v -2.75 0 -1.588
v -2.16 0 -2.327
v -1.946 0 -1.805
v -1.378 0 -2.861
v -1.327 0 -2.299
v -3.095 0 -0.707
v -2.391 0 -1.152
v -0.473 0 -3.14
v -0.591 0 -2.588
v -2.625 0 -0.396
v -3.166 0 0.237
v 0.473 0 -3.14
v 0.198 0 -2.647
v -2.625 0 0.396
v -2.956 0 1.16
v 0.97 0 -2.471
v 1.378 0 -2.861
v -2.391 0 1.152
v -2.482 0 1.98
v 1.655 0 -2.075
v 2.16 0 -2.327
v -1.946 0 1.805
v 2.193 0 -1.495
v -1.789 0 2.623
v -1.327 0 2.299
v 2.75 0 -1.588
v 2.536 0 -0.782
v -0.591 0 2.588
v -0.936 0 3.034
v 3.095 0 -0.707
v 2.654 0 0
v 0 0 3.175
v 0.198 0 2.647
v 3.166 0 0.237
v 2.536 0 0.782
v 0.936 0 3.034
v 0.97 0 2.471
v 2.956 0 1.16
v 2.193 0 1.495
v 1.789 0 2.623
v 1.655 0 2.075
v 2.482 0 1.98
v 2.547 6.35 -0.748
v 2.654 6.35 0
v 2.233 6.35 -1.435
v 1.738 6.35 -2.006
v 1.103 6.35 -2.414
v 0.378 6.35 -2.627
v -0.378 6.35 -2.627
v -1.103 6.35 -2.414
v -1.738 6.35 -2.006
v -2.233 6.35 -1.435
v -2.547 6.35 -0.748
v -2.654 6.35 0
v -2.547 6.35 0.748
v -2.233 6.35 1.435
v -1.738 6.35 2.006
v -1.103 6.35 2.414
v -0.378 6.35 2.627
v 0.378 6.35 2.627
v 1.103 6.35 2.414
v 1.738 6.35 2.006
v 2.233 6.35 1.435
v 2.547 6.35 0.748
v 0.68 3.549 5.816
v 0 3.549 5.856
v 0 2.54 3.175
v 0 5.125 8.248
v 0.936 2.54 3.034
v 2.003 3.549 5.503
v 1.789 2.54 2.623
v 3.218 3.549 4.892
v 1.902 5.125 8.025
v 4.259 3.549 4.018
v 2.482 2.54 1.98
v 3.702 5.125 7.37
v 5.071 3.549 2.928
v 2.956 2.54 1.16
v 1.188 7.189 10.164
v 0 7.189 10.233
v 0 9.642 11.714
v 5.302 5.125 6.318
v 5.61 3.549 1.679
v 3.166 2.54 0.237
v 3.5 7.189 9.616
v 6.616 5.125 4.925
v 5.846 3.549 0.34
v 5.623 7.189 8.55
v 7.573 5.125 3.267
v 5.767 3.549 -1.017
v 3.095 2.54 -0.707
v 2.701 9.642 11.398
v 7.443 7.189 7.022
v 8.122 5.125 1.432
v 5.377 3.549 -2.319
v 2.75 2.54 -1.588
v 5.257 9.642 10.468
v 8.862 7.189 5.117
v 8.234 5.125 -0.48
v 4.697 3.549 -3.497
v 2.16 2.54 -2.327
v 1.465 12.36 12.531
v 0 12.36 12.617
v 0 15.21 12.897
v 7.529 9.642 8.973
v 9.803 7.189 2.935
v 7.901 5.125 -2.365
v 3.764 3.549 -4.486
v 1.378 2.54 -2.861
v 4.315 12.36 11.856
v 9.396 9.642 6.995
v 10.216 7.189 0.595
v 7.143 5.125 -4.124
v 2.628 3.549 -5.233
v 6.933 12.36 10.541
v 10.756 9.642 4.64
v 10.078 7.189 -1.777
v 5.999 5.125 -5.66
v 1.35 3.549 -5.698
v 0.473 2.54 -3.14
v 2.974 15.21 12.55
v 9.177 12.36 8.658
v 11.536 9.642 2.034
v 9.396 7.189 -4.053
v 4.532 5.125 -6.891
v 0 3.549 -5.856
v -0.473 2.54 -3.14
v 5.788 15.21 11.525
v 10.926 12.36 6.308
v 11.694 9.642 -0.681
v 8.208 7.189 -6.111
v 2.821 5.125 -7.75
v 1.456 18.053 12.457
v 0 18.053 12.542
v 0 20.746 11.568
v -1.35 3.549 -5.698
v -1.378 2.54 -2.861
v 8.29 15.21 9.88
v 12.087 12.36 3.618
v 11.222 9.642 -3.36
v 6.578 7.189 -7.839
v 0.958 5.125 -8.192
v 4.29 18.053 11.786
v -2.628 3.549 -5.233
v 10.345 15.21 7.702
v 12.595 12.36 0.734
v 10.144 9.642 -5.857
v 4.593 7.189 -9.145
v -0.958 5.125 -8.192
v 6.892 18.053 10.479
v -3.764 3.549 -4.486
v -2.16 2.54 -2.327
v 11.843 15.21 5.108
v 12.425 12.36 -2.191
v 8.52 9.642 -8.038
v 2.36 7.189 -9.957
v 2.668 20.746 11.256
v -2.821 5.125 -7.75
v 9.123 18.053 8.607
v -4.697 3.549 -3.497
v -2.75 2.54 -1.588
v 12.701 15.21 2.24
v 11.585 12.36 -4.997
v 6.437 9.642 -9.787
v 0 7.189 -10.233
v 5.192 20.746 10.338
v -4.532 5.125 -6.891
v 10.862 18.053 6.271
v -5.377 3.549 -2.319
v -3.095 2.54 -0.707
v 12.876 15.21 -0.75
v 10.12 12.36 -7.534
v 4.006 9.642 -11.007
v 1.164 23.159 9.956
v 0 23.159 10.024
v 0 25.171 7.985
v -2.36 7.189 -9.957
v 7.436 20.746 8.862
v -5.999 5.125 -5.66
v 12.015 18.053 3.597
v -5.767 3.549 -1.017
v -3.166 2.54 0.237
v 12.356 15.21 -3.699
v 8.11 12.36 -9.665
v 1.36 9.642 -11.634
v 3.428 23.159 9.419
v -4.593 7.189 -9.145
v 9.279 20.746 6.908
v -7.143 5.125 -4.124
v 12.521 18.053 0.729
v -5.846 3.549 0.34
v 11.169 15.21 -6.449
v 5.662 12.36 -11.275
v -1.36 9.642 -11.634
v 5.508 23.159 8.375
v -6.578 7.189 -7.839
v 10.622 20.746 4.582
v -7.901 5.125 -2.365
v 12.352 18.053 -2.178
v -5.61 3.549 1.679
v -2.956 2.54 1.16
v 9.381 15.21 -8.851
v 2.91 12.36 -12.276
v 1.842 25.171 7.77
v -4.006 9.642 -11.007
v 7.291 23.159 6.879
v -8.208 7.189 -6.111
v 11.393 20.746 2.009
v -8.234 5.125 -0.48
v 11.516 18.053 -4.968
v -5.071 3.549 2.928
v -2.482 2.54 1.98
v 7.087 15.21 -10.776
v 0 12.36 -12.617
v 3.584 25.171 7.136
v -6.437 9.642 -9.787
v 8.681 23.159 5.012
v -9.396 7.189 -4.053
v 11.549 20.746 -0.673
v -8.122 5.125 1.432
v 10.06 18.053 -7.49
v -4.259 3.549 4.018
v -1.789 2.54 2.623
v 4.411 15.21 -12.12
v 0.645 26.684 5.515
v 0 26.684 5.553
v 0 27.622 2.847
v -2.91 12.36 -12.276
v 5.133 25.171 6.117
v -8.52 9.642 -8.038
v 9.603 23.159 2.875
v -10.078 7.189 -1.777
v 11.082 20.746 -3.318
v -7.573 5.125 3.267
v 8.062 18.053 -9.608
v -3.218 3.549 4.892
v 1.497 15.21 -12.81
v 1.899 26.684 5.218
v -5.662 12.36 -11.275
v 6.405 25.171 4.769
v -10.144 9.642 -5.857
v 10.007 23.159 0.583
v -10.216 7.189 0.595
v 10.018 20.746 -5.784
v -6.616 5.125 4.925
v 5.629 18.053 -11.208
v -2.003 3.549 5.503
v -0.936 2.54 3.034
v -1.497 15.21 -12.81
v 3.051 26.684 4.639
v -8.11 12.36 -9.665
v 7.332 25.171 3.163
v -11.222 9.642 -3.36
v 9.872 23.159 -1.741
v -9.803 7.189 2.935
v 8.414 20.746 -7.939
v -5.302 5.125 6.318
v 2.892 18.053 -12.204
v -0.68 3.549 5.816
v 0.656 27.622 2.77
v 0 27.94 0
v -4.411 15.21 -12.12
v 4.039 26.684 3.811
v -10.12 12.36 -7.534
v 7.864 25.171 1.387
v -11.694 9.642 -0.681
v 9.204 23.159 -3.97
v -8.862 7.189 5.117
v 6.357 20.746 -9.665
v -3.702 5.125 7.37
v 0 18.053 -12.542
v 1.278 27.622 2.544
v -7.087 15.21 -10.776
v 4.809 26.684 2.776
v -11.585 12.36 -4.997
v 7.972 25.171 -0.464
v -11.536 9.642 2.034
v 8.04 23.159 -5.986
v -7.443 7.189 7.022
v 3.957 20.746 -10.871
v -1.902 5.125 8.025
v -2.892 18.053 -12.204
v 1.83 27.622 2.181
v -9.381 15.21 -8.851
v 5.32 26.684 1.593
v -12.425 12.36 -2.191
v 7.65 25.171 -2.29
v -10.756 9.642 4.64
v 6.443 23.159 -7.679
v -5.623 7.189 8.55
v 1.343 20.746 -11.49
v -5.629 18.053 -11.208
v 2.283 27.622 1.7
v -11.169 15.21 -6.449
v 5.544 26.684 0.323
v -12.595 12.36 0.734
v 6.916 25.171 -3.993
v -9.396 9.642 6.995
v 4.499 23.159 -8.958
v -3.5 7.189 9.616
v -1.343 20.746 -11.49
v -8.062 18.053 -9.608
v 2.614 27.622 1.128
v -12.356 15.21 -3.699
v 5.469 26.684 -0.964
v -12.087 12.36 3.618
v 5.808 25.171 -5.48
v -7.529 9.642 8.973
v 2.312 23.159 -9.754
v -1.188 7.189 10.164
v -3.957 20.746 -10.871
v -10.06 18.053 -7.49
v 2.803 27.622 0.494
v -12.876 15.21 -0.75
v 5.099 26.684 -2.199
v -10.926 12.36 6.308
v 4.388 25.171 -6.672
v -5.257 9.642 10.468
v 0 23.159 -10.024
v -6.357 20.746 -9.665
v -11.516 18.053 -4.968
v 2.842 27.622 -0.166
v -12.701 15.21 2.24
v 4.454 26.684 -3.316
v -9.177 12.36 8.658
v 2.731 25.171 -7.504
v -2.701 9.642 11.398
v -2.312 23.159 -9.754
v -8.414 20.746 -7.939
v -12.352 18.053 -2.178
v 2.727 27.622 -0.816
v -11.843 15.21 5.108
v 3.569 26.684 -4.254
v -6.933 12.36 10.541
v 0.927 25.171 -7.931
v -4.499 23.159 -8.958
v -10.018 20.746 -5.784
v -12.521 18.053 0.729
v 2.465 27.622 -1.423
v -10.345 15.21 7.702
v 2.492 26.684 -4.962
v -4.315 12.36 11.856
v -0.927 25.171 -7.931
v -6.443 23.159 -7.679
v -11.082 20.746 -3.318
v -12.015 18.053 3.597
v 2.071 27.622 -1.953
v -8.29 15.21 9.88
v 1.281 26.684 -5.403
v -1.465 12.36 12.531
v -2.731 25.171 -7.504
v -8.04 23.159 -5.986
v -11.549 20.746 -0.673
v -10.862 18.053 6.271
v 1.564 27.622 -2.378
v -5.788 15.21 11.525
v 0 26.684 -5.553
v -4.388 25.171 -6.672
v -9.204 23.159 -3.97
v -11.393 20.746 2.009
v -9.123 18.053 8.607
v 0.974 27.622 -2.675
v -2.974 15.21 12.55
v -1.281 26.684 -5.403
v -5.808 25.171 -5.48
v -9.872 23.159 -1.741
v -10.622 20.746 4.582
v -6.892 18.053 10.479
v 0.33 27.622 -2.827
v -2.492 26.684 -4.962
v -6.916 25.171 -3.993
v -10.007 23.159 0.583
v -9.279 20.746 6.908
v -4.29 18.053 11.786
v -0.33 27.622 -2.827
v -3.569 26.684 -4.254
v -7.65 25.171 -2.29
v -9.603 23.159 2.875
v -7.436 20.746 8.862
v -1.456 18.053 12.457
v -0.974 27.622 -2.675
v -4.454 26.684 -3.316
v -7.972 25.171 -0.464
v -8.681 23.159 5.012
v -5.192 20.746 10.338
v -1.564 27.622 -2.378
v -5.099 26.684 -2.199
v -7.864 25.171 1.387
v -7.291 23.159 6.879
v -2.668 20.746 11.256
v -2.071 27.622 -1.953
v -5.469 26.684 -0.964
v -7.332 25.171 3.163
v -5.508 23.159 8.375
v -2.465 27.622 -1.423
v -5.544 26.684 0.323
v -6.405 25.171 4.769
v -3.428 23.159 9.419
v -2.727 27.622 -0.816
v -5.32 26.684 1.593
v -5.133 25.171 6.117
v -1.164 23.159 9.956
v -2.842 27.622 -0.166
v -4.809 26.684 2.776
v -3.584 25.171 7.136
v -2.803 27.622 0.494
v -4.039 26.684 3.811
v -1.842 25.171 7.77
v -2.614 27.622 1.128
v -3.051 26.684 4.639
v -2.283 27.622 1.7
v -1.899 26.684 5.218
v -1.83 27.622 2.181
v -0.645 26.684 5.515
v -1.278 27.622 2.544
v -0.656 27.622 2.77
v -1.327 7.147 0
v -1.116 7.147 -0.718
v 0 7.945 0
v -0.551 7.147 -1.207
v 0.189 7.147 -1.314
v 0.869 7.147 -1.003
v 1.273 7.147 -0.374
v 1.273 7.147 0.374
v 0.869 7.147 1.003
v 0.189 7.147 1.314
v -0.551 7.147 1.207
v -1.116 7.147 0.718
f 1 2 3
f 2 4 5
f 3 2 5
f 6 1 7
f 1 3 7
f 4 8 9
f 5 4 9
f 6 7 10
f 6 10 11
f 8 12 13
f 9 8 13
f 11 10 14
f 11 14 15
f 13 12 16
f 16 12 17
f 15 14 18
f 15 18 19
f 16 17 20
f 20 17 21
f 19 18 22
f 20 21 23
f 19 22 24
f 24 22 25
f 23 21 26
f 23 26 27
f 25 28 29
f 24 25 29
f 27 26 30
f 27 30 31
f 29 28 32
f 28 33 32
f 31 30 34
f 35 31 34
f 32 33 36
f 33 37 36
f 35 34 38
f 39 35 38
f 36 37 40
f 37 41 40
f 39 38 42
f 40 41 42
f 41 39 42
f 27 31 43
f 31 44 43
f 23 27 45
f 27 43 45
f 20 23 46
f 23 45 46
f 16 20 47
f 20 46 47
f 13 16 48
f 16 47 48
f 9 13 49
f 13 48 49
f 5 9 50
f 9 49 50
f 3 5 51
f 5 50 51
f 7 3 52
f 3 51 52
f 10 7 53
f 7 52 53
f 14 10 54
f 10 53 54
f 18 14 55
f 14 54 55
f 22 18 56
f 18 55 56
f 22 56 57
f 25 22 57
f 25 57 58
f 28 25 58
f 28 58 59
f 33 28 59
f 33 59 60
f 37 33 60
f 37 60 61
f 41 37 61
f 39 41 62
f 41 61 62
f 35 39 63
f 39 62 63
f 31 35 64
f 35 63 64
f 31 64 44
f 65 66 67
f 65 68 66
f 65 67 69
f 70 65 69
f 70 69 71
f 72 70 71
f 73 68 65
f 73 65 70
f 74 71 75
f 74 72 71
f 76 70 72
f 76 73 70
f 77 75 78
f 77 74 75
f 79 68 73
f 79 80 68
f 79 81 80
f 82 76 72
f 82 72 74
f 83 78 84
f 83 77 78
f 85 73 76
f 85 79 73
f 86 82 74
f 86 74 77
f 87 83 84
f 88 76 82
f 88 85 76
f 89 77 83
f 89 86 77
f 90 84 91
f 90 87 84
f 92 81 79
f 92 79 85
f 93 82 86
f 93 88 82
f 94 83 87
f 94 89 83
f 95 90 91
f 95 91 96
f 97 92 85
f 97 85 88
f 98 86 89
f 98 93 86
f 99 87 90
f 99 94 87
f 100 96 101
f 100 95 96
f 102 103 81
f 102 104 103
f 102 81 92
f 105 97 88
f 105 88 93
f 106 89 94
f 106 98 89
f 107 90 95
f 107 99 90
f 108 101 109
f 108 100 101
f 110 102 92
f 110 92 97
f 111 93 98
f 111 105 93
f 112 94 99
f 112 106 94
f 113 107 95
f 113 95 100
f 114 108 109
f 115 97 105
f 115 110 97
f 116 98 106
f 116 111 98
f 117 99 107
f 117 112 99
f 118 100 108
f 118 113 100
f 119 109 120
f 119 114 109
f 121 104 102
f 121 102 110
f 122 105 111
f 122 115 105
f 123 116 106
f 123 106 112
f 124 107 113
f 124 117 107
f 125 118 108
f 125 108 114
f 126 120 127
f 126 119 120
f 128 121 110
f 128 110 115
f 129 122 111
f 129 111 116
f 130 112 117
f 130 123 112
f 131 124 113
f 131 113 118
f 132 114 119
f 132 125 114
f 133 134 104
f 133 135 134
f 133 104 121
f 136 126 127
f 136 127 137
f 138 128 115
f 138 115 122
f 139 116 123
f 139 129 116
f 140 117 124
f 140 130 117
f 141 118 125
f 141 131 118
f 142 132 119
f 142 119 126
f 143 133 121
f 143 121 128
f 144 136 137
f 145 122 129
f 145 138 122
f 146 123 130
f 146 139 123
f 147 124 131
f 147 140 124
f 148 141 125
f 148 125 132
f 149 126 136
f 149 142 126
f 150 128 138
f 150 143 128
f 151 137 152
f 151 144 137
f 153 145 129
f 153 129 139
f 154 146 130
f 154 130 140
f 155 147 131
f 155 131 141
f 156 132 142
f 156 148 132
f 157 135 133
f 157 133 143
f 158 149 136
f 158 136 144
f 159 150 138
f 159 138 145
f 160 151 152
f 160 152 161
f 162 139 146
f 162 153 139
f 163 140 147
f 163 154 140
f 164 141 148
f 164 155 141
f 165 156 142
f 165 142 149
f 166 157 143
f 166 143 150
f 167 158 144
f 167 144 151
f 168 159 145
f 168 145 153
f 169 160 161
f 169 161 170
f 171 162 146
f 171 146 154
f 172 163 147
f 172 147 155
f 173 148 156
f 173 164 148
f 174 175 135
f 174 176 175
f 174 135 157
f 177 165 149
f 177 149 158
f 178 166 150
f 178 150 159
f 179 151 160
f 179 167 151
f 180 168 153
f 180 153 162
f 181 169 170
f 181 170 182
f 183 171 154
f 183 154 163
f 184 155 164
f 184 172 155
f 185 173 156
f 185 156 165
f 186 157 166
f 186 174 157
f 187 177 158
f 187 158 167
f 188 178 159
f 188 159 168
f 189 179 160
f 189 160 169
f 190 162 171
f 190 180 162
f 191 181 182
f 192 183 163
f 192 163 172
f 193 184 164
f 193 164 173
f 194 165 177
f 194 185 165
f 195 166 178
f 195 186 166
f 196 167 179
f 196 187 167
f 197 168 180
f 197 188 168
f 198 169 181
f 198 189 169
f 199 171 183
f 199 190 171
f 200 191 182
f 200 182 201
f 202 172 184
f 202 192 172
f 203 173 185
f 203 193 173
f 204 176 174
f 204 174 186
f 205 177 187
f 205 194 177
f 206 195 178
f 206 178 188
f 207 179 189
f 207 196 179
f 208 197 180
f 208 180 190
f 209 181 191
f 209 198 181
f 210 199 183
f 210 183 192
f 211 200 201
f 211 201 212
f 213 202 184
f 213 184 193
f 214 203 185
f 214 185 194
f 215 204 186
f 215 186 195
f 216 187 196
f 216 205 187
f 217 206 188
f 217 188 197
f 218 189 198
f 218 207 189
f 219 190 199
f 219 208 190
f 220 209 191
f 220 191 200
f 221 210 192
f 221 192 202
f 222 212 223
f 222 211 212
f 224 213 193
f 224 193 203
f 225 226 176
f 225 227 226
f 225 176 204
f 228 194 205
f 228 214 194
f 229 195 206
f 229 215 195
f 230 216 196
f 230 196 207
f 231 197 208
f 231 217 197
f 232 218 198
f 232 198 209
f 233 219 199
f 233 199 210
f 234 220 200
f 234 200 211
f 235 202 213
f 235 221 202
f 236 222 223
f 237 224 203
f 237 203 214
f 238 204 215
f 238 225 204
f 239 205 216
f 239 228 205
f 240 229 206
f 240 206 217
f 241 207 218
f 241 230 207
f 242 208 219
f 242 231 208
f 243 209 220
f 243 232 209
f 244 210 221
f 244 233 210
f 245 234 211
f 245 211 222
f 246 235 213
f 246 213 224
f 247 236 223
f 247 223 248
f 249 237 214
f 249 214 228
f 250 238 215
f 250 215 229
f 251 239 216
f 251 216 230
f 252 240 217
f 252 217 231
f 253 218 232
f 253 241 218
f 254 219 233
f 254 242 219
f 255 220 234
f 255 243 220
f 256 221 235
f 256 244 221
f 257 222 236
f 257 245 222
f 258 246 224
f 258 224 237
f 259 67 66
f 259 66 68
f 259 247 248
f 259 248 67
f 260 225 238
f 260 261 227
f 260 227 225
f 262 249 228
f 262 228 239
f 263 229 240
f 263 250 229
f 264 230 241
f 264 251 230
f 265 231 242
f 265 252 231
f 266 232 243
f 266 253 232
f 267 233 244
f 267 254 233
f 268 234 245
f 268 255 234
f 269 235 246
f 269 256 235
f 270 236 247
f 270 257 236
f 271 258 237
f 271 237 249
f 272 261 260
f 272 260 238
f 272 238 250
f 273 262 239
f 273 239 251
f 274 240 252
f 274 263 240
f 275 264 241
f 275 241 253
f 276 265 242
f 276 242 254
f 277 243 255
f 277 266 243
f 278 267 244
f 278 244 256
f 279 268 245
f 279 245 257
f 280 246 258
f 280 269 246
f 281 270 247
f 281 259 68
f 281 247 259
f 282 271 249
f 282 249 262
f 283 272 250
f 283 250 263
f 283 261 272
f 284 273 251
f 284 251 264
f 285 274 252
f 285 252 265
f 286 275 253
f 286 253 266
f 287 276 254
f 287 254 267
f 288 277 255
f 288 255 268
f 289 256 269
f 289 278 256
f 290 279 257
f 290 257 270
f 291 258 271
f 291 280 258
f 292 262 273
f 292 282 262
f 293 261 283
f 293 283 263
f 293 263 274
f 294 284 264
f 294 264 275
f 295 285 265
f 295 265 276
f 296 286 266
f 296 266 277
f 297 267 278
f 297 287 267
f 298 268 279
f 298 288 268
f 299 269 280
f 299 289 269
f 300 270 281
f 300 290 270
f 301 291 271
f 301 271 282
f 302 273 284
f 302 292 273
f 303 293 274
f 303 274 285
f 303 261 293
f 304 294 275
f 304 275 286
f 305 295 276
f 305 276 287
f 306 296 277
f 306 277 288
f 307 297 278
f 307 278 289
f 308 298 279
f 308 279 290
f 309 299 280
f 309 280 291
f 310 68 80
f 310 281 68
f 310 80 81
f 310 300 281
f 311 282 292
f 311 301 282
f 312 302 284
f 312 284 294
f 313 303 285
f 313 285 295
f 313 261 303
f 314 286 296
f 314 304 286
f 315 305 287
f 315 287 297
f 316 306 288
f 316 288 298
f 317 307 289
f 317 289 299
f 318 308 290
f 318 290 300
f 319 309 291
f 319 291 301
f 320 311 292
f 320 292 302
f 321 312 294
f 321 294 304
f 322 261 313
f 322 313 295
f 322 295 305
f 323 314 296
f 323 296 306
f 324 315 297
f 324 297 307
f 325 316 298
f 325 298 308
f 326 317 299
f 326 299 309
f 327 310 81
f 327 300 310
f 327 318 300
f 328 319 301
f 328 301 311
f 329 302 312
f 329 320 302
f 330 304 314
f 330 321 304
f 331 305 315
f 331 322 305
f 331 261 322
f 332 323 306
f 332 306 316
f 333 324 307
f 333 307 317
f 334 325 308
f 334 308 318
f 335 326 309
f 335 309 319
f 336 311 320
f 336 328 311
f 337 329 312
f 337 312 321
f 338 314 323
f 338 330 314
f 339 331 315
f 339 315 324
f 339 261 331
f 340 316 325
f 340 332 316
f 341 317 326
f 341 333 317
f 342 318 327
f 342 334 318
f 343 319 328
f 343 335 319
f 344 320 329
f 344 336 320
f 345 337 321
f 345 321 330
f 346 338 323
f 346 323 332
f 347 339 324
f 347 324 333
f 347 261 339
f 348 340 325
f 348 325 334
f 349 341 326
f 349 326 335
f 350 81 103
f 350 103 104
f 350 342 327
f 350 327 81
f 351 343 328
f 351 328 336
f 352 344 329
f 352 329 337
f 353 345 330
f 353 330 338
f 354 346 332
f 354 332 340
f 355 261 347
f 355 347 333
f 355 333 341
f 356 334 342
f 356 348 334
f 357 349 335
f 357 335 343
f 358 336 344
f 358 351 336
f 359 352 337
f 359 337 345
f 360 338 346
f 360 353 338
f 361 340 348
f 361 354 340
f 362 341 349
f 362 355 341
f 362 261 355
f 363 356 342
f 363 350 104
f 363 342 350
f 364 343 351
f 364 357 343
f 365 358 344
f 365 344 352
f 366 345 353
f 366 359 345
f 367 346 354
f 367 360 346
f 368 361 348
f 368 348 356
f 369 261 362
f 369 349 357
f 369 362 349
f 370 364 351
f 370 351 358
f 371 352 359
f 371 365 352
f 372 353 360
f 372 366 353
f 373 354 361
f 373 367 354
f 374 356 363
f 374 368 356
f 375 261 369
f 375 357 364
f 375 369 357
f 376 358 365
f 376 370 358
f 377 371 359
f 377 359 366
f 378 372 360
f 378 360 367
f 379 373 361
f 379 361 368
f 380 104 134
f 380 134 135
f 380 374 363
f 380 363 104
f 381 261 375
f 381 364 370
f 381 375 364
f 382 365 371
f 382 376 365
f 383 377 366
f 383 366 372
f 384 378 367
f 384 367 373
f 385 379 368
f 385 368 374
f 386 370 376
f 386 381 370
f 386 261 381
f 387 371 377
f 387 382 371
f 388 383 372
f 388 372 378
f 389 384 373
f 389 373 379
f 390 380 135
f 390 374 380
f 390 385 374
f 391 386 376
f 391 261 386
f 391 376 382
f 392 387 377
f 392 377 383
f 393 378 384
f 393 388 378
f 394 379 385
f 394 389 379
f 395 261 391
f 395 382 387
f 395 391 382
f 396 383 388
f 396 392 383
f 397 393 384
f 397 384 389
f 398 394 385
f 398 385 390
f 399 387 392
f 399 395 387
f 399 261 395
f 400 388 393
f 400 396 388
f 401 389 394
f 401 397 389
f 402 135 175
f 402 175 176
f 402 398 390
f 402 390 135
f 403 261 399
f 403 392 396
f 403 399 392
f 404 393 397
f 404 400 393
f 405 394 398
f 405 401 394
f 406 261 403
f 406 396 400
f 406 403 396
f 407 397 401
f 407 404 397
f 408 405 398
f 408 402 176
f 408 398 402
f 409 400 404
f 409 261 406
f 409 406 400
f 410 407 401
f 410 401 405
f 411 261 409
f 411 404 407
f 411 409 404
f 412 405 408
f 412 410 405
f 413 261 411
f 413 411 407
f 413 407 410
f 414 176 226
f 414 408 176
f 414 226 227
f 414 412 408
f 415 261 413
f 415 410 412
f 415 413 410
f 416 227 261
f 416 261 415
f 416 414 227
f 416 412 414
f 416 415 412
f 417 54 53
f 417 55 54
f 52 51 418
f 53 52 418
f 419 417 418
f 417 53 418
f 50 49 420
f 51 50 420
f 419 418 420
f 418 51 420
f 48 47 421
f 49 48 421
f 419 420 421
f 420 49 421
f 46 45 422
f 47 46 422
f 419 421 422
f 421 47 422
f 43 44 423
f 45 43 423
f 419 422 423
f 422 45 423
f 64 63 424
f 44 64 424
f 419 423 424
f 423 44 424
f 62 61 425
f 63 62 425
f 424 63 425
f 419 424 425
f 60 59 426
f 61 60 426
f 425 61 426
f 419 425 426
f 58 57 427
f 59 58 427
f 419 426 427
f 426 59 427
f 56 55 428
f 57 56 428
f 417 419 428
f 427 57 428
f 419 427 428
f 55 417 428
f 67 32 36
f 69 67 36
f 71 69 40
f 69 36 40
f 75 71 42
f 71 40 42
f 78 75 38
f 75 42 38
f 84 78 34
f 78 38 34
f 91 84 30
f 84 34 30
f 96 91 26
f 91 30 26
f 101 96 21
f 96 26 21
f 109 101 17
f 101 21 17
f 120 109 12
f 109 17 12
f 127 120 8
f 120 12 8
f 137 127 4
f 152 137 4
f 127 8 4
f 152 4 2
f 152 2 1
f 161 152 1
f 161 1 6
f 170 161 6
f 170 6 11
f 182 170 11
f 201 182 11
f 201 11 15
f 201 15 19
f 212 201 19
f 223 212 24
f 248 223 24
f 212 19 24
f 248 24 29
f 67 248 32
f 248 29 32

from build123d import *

# Parameters (mm, degrees)
SKETCH1_R                      = 3.175
BOSS_EXTRUDE1_DEPTH            = 2.54
DOME1_FACE_RADIUS              = 3.175
DOME1_HEIGHT                   = 25.4
SKETCH8_R                      = 1.5875
CUT_EXTRUDE1_DEPTH             = 6.35
F_4_0_209_DIAMETER_HOLE1_D     = 5.3086
F_4_0_209_DIAMETER_HOLE1_DEPTH = 6.35
F_4_0_209_DIAMETER_HOLE1_TIP   = 1.594864341


with BuildPart() as part:
    # Sketch1 → Boss-Extrude1 (new body)
    with BuildSketch(Plane(origin=(0, 0, 0), x_dir=(1, 0, 0), z_dir=(0, 1, 0))):
        with Locations(Location((0, 0, 0), (0, 0, 270))):
            Circle(SKETCH1_R)
    extrude(amount=BOSS_EXTRUDE1_DEPTH)

    # Dome1: a dome of height H over a round flat face of radius A is a cap of a sphere of radius (A * A + H * H) / (2 * H)
    dome1_r = (DOME1_FACE_RADIUS * DOME1_FACE_RADIUS + DOME1_HEIGHT * DOME1_HEIGHT) / (2 * DOME1_HEIGHT)
    dome1_base = Plane((0, 2.54, 0), z_dir=(0, 1, 0))
    with Locations(dome1_base.offset(DOME1_HEIGHT - dome1_r)):
        dome1_ball = Sphere(dome1_r, mode=Mode.PRIVATE)
    add(split(dome1_ball, bisect_by=dome1_base, keep=Keep.TOP, mode=Mode.PRIVATE))

    # Sketch8 → Cut-Extrude1 (cut)
    with BuildSketch(Plane.XZ):
        with Locations(Location((0, 0, 0), (0, 0, 270))):
            Circle(SKETCH8_R)
    extrude(amount=-CUT_EXTRUDE1_DEPTH, mode=Mode.SUBTRACT)

    # #4 (0.209) Diameter Hole1
    with Locations(Plane(origin=(0, 0, 0), x_dir=(-1, 0, 0), z_dir=(0, -1, 0))):
        with Locations((0, 0)):
            Hole(F_4_0_209_DIAMETER_HOLE1_D / 2, depth=F_4_0_209_DIAMETER_HOLE1_DEPTH)
            with Locations((0, 0, -(F_4_0_209_DIAMETER_HOLE1_DEPTH + F_4_0_209_DIAMETER_HOLE1_TIP / 2))):  # 118° drill point
                Cone(0, F_4_0_209_DIAMETER_HOLE1_D / 2, F_4_0_209_DIAMETER_HOLE1_TIP, mode=Mode.SUBTRACT)


solid = part.part
